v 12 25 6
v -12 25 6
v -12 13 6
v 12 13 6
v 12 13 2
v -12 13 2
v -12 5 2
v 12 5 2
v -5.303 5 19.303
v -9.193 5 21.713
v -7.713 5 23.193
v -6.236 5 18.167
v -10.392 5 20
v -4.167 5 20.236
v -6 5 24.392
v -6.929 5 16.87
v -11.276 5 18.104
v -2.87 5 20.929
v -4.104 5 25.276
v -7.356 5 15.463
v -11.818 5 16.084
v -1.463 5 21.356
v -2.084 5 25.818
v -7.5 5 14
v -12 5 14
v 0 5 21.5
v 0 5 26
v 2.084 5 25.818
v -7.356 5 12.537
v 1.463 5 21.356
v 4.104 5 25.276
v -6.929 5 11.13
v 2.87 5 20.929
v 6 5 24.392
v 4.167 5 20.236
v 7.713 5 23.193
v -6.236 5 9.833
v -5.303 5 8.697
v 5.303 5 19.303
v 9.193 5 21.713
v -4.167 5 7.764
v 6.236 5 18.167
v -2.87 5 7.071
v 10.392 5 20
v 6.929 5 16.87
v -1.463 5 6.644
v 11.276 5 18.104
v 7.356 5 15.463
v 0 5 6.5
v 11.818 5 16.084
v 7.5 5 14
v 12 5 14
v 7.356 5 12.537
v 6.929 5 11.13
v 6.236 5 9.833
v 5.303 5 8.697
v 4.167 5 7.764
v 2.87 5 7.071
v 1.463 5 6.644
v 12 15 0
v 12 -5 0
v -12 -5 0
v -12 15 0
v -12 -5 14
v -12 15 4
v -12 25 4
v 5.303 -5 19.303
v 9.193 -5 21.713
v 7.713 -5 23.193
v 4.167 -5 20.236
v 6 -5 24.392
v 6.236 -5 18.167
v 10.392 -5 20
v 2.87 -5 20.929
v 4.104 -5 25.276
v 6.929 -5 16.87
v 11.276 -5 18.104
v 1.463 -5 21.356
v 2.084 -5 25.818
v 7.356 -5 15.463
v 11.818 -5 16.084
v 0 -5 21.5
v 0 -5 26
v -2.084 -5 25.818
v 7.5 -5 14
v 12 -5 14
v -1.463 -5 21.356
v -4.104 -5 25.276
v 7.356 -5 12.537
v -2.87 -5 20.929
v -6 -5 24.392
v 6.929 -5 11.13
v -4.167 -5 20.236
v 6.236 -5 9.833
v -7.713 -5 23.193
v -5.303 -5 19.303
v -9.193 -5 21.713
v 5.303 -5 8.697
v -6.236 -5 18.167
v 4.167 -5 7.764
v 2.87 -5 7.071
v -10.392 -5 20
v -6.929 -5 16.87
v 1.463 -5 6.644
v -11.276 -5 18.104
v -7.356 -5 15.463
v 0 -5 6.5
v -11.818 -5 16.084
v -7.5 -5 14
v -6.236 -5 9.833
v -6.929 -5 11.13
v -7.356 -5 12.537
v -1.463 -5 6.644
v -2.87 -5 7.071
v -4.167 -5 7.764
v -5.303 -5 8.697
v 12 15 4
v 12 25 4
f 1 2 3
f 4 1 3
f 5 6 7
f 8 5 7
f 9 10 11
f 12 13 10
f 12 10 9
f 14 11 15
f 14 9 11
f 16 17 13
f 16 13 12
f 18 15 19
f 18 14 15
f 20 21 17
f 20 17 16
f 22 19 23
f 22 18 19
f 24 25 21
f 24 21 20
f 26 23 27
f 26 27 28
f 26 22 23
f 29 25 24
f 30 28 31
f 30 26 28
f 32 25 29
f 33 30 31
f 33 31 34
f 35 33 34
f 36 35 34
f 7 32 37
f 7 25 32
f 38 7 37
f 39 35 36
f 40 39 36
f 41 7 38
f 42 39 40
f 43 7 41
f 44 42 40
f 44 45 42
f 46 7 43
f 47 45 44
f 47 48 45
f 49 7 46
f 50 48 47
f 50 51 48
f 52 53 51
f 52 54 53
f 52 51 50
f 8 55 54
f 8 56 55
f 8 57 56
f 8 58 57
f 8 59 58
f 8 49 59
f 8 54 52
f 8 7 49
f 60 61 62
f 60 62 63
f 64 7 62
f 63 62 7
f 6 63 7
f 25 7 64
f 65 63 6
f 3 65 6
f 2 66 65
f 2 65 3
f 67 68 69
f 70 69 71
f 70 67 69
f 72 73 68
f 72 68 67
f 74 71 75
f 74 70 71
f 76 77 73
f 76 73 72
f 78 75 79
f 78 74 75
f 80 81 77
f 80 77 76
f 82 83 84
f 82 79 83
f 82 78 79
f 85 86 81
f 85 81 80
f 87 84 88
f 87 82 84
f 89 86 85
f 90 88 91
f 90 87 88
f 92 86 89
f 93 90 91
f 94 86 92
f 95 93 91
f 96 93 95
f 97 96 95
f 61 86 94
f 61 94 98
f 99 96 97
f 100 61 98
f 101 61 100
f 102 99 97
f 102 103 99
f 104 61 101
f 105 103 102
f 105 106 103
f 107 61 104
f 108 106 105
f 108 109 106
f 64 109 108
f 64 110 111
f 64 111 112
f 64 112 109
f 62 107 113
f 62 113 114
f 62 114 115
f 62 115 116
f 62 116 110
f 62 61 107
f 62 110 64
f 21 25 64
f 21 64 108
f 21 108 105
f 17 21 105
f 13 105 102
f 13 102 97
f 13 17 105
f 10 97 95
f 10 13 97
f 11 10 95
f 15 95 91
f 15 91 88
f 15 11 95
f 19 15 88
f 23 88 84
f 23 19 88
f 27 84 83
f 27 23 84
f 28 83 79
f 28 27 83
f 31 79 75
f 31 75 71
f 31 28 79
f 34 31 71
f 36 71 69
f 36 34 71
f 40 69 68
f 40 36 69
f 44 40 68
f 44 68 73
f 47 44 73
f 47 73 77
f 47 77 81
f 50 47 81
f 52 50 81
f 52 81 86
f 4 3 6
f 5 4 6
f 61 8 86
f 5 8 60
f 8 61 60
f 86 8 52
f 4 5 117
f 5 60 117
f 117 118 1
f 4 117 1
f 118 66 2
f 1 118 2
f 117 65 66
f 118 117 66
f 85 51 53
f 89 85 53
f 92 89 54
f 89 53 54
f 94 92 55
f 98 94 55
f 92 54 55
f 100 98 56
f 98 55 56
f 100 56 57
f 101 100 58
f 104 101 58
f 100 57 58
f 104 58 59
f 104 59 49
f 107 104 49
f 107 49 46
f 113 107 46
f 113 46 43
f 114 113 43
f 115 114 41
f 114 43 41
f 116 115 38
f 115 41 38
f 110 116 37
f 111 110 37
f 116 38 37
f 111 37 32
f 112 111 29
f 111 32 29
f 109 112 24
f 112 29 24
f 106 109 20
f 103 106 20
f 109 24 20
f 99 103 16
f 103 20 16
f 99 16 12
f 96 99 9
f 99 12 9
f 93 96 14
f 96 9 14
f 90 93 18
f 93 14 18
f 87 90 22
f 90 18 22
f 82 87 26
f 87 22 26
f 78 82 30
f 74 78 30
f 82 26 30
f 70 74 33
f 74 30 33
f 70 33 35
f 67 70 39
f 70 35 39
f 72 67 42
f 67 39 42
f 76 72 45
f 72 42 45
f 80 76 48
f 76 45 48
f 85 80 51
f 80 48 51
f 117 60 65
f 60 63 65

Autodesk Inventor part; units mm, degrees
ref_plane "YZ Plane" through (0, 0, 0) normal (1, 0, 0) x (0, 1, 0)
ref_plane "XZ Plane" through (0, 0, 0) normal (0, 1, 0) x (-1, 0, 0)
ref_plane "XY Plane" through (0, 0, 0) normal (0, 0, 1) x (1, 0, 0)
sketch "Sketch1" plane through (0, 0, 0) normal (0, 0, 1) x (1, 0, 0)
  line L0 (-12, 5) -> (12, 5)
  line L1 (12, 5) -> (12, -5)
  line L2 (12, -5) -> (-12, -5)
  line L3 (-12, -5) -> (-12, 5)
  point P0 (0, 0)
  dimension "d0" = 24
  dimension "d1" = 10
  dimension "d2" = 5
  dimension "d3" = 12
extrude "Extrusion1" add sketch "Sketch1" along normal blind 28
sketch "Sketch2" plane through (-12, 5, 0) normal (0, 1, 0) x (1, 0, 0)
  line L0 (0, 0) -> (24, 0) projected
  line L1 (0, 0) -> (0, -28) projected
  line L2 (24, -28) -> (0, -28) projected
  line L3 (24, 0) -> (24, -28) projected
  circle A0 centre (12, -14) radius 7.5
  point P0 (12, 0)
  dimension "d6" = 15
  dimension "d7" = 28
  dimension "d8" = 24
  dimension "d9" = 12
  dimension "d10" = 14
extrude "Extrusion2" cut sketch "Sketch2" against normal up to next contours A0
sketch "Sketch7" plane through (-12, 5, 28) normal (0, 1, 0) x (1, 0, 0)
  circle A0 centre (12, 14) radius 7.5 projected
  line L0 (0, 28) -> (0, 0) projected
  line L1 (24, 0) -> (0, 0) projected
  line L2 (24, 28) -> (24, 0) projected
  arc A1 (0, 14) -> (24, 14) centre (12, 14) ccw
  line L3 (24, 32) -> (24, 0) projected
  line L4 (24, 32) -> (24, 0) projected
  line L5 (24, 14) -> (24, 0)
  line L6 (24, 0) -> (0, 0)
  line L7 (24, 0) -> (0, 0) projected
  line L8 (0, 0) -> (0, 14)
  line L9 (0, 32) -> (0, 0) projected
  line L10 (0, 28) -> (24, 28) projected
  point P0 (12, 28)
extrude "Extrusion6" cut sketch "Sketch7" against normal blind 20 contours A1 L2 L1 L0
sketch "Sketch9" plane through (-12, -5, 0) normal (-1, 0, 0) x (0, 0, 1)
  line L0 (14, 0) -> (14, 10) construction
  line L1 (0, 10) -> (14, 10) construction
  line L2 (0, 0) -> (0, 10) construction
  line L3 (0, 0) -> (14, 0) construction
  line L4 (0, 10) -> (14, 10) projected
  line L5 (0, 10) -> (0, 20)
  line L6 (0, 20) -> (4, 20)
  line L7 (4, 20) -> (4, 30)
  line L8 (4, 30) -> (6, 30)
  line L9 (6, 30) -> (6, 18)
  line L10 (6, 18) -> (2, 18)
  line L11 (2, 18) -> (2, 10)
  line L12 (0, 10) -> (2, 10)
  point P0 (0, 5)
  dimension "d32" = 10
  dimension "d33" = 4
  dimension "d34" = 10
  dimension "d35" = 2
  dimension "d36" = 2
  dimension "d37" = 2
extrude "Extrusion8" add sketch "Sketch9" against normal up to surface (24 mm away)
equation "\"d2\" = 0.5 * d1"
equation "\"d3\" = 0.5 * d0"
equation "\"d9\" = 0.5 * d8"
equation "\"d10\" = 0.5 * d7"
properties part number "ProbeMount"
